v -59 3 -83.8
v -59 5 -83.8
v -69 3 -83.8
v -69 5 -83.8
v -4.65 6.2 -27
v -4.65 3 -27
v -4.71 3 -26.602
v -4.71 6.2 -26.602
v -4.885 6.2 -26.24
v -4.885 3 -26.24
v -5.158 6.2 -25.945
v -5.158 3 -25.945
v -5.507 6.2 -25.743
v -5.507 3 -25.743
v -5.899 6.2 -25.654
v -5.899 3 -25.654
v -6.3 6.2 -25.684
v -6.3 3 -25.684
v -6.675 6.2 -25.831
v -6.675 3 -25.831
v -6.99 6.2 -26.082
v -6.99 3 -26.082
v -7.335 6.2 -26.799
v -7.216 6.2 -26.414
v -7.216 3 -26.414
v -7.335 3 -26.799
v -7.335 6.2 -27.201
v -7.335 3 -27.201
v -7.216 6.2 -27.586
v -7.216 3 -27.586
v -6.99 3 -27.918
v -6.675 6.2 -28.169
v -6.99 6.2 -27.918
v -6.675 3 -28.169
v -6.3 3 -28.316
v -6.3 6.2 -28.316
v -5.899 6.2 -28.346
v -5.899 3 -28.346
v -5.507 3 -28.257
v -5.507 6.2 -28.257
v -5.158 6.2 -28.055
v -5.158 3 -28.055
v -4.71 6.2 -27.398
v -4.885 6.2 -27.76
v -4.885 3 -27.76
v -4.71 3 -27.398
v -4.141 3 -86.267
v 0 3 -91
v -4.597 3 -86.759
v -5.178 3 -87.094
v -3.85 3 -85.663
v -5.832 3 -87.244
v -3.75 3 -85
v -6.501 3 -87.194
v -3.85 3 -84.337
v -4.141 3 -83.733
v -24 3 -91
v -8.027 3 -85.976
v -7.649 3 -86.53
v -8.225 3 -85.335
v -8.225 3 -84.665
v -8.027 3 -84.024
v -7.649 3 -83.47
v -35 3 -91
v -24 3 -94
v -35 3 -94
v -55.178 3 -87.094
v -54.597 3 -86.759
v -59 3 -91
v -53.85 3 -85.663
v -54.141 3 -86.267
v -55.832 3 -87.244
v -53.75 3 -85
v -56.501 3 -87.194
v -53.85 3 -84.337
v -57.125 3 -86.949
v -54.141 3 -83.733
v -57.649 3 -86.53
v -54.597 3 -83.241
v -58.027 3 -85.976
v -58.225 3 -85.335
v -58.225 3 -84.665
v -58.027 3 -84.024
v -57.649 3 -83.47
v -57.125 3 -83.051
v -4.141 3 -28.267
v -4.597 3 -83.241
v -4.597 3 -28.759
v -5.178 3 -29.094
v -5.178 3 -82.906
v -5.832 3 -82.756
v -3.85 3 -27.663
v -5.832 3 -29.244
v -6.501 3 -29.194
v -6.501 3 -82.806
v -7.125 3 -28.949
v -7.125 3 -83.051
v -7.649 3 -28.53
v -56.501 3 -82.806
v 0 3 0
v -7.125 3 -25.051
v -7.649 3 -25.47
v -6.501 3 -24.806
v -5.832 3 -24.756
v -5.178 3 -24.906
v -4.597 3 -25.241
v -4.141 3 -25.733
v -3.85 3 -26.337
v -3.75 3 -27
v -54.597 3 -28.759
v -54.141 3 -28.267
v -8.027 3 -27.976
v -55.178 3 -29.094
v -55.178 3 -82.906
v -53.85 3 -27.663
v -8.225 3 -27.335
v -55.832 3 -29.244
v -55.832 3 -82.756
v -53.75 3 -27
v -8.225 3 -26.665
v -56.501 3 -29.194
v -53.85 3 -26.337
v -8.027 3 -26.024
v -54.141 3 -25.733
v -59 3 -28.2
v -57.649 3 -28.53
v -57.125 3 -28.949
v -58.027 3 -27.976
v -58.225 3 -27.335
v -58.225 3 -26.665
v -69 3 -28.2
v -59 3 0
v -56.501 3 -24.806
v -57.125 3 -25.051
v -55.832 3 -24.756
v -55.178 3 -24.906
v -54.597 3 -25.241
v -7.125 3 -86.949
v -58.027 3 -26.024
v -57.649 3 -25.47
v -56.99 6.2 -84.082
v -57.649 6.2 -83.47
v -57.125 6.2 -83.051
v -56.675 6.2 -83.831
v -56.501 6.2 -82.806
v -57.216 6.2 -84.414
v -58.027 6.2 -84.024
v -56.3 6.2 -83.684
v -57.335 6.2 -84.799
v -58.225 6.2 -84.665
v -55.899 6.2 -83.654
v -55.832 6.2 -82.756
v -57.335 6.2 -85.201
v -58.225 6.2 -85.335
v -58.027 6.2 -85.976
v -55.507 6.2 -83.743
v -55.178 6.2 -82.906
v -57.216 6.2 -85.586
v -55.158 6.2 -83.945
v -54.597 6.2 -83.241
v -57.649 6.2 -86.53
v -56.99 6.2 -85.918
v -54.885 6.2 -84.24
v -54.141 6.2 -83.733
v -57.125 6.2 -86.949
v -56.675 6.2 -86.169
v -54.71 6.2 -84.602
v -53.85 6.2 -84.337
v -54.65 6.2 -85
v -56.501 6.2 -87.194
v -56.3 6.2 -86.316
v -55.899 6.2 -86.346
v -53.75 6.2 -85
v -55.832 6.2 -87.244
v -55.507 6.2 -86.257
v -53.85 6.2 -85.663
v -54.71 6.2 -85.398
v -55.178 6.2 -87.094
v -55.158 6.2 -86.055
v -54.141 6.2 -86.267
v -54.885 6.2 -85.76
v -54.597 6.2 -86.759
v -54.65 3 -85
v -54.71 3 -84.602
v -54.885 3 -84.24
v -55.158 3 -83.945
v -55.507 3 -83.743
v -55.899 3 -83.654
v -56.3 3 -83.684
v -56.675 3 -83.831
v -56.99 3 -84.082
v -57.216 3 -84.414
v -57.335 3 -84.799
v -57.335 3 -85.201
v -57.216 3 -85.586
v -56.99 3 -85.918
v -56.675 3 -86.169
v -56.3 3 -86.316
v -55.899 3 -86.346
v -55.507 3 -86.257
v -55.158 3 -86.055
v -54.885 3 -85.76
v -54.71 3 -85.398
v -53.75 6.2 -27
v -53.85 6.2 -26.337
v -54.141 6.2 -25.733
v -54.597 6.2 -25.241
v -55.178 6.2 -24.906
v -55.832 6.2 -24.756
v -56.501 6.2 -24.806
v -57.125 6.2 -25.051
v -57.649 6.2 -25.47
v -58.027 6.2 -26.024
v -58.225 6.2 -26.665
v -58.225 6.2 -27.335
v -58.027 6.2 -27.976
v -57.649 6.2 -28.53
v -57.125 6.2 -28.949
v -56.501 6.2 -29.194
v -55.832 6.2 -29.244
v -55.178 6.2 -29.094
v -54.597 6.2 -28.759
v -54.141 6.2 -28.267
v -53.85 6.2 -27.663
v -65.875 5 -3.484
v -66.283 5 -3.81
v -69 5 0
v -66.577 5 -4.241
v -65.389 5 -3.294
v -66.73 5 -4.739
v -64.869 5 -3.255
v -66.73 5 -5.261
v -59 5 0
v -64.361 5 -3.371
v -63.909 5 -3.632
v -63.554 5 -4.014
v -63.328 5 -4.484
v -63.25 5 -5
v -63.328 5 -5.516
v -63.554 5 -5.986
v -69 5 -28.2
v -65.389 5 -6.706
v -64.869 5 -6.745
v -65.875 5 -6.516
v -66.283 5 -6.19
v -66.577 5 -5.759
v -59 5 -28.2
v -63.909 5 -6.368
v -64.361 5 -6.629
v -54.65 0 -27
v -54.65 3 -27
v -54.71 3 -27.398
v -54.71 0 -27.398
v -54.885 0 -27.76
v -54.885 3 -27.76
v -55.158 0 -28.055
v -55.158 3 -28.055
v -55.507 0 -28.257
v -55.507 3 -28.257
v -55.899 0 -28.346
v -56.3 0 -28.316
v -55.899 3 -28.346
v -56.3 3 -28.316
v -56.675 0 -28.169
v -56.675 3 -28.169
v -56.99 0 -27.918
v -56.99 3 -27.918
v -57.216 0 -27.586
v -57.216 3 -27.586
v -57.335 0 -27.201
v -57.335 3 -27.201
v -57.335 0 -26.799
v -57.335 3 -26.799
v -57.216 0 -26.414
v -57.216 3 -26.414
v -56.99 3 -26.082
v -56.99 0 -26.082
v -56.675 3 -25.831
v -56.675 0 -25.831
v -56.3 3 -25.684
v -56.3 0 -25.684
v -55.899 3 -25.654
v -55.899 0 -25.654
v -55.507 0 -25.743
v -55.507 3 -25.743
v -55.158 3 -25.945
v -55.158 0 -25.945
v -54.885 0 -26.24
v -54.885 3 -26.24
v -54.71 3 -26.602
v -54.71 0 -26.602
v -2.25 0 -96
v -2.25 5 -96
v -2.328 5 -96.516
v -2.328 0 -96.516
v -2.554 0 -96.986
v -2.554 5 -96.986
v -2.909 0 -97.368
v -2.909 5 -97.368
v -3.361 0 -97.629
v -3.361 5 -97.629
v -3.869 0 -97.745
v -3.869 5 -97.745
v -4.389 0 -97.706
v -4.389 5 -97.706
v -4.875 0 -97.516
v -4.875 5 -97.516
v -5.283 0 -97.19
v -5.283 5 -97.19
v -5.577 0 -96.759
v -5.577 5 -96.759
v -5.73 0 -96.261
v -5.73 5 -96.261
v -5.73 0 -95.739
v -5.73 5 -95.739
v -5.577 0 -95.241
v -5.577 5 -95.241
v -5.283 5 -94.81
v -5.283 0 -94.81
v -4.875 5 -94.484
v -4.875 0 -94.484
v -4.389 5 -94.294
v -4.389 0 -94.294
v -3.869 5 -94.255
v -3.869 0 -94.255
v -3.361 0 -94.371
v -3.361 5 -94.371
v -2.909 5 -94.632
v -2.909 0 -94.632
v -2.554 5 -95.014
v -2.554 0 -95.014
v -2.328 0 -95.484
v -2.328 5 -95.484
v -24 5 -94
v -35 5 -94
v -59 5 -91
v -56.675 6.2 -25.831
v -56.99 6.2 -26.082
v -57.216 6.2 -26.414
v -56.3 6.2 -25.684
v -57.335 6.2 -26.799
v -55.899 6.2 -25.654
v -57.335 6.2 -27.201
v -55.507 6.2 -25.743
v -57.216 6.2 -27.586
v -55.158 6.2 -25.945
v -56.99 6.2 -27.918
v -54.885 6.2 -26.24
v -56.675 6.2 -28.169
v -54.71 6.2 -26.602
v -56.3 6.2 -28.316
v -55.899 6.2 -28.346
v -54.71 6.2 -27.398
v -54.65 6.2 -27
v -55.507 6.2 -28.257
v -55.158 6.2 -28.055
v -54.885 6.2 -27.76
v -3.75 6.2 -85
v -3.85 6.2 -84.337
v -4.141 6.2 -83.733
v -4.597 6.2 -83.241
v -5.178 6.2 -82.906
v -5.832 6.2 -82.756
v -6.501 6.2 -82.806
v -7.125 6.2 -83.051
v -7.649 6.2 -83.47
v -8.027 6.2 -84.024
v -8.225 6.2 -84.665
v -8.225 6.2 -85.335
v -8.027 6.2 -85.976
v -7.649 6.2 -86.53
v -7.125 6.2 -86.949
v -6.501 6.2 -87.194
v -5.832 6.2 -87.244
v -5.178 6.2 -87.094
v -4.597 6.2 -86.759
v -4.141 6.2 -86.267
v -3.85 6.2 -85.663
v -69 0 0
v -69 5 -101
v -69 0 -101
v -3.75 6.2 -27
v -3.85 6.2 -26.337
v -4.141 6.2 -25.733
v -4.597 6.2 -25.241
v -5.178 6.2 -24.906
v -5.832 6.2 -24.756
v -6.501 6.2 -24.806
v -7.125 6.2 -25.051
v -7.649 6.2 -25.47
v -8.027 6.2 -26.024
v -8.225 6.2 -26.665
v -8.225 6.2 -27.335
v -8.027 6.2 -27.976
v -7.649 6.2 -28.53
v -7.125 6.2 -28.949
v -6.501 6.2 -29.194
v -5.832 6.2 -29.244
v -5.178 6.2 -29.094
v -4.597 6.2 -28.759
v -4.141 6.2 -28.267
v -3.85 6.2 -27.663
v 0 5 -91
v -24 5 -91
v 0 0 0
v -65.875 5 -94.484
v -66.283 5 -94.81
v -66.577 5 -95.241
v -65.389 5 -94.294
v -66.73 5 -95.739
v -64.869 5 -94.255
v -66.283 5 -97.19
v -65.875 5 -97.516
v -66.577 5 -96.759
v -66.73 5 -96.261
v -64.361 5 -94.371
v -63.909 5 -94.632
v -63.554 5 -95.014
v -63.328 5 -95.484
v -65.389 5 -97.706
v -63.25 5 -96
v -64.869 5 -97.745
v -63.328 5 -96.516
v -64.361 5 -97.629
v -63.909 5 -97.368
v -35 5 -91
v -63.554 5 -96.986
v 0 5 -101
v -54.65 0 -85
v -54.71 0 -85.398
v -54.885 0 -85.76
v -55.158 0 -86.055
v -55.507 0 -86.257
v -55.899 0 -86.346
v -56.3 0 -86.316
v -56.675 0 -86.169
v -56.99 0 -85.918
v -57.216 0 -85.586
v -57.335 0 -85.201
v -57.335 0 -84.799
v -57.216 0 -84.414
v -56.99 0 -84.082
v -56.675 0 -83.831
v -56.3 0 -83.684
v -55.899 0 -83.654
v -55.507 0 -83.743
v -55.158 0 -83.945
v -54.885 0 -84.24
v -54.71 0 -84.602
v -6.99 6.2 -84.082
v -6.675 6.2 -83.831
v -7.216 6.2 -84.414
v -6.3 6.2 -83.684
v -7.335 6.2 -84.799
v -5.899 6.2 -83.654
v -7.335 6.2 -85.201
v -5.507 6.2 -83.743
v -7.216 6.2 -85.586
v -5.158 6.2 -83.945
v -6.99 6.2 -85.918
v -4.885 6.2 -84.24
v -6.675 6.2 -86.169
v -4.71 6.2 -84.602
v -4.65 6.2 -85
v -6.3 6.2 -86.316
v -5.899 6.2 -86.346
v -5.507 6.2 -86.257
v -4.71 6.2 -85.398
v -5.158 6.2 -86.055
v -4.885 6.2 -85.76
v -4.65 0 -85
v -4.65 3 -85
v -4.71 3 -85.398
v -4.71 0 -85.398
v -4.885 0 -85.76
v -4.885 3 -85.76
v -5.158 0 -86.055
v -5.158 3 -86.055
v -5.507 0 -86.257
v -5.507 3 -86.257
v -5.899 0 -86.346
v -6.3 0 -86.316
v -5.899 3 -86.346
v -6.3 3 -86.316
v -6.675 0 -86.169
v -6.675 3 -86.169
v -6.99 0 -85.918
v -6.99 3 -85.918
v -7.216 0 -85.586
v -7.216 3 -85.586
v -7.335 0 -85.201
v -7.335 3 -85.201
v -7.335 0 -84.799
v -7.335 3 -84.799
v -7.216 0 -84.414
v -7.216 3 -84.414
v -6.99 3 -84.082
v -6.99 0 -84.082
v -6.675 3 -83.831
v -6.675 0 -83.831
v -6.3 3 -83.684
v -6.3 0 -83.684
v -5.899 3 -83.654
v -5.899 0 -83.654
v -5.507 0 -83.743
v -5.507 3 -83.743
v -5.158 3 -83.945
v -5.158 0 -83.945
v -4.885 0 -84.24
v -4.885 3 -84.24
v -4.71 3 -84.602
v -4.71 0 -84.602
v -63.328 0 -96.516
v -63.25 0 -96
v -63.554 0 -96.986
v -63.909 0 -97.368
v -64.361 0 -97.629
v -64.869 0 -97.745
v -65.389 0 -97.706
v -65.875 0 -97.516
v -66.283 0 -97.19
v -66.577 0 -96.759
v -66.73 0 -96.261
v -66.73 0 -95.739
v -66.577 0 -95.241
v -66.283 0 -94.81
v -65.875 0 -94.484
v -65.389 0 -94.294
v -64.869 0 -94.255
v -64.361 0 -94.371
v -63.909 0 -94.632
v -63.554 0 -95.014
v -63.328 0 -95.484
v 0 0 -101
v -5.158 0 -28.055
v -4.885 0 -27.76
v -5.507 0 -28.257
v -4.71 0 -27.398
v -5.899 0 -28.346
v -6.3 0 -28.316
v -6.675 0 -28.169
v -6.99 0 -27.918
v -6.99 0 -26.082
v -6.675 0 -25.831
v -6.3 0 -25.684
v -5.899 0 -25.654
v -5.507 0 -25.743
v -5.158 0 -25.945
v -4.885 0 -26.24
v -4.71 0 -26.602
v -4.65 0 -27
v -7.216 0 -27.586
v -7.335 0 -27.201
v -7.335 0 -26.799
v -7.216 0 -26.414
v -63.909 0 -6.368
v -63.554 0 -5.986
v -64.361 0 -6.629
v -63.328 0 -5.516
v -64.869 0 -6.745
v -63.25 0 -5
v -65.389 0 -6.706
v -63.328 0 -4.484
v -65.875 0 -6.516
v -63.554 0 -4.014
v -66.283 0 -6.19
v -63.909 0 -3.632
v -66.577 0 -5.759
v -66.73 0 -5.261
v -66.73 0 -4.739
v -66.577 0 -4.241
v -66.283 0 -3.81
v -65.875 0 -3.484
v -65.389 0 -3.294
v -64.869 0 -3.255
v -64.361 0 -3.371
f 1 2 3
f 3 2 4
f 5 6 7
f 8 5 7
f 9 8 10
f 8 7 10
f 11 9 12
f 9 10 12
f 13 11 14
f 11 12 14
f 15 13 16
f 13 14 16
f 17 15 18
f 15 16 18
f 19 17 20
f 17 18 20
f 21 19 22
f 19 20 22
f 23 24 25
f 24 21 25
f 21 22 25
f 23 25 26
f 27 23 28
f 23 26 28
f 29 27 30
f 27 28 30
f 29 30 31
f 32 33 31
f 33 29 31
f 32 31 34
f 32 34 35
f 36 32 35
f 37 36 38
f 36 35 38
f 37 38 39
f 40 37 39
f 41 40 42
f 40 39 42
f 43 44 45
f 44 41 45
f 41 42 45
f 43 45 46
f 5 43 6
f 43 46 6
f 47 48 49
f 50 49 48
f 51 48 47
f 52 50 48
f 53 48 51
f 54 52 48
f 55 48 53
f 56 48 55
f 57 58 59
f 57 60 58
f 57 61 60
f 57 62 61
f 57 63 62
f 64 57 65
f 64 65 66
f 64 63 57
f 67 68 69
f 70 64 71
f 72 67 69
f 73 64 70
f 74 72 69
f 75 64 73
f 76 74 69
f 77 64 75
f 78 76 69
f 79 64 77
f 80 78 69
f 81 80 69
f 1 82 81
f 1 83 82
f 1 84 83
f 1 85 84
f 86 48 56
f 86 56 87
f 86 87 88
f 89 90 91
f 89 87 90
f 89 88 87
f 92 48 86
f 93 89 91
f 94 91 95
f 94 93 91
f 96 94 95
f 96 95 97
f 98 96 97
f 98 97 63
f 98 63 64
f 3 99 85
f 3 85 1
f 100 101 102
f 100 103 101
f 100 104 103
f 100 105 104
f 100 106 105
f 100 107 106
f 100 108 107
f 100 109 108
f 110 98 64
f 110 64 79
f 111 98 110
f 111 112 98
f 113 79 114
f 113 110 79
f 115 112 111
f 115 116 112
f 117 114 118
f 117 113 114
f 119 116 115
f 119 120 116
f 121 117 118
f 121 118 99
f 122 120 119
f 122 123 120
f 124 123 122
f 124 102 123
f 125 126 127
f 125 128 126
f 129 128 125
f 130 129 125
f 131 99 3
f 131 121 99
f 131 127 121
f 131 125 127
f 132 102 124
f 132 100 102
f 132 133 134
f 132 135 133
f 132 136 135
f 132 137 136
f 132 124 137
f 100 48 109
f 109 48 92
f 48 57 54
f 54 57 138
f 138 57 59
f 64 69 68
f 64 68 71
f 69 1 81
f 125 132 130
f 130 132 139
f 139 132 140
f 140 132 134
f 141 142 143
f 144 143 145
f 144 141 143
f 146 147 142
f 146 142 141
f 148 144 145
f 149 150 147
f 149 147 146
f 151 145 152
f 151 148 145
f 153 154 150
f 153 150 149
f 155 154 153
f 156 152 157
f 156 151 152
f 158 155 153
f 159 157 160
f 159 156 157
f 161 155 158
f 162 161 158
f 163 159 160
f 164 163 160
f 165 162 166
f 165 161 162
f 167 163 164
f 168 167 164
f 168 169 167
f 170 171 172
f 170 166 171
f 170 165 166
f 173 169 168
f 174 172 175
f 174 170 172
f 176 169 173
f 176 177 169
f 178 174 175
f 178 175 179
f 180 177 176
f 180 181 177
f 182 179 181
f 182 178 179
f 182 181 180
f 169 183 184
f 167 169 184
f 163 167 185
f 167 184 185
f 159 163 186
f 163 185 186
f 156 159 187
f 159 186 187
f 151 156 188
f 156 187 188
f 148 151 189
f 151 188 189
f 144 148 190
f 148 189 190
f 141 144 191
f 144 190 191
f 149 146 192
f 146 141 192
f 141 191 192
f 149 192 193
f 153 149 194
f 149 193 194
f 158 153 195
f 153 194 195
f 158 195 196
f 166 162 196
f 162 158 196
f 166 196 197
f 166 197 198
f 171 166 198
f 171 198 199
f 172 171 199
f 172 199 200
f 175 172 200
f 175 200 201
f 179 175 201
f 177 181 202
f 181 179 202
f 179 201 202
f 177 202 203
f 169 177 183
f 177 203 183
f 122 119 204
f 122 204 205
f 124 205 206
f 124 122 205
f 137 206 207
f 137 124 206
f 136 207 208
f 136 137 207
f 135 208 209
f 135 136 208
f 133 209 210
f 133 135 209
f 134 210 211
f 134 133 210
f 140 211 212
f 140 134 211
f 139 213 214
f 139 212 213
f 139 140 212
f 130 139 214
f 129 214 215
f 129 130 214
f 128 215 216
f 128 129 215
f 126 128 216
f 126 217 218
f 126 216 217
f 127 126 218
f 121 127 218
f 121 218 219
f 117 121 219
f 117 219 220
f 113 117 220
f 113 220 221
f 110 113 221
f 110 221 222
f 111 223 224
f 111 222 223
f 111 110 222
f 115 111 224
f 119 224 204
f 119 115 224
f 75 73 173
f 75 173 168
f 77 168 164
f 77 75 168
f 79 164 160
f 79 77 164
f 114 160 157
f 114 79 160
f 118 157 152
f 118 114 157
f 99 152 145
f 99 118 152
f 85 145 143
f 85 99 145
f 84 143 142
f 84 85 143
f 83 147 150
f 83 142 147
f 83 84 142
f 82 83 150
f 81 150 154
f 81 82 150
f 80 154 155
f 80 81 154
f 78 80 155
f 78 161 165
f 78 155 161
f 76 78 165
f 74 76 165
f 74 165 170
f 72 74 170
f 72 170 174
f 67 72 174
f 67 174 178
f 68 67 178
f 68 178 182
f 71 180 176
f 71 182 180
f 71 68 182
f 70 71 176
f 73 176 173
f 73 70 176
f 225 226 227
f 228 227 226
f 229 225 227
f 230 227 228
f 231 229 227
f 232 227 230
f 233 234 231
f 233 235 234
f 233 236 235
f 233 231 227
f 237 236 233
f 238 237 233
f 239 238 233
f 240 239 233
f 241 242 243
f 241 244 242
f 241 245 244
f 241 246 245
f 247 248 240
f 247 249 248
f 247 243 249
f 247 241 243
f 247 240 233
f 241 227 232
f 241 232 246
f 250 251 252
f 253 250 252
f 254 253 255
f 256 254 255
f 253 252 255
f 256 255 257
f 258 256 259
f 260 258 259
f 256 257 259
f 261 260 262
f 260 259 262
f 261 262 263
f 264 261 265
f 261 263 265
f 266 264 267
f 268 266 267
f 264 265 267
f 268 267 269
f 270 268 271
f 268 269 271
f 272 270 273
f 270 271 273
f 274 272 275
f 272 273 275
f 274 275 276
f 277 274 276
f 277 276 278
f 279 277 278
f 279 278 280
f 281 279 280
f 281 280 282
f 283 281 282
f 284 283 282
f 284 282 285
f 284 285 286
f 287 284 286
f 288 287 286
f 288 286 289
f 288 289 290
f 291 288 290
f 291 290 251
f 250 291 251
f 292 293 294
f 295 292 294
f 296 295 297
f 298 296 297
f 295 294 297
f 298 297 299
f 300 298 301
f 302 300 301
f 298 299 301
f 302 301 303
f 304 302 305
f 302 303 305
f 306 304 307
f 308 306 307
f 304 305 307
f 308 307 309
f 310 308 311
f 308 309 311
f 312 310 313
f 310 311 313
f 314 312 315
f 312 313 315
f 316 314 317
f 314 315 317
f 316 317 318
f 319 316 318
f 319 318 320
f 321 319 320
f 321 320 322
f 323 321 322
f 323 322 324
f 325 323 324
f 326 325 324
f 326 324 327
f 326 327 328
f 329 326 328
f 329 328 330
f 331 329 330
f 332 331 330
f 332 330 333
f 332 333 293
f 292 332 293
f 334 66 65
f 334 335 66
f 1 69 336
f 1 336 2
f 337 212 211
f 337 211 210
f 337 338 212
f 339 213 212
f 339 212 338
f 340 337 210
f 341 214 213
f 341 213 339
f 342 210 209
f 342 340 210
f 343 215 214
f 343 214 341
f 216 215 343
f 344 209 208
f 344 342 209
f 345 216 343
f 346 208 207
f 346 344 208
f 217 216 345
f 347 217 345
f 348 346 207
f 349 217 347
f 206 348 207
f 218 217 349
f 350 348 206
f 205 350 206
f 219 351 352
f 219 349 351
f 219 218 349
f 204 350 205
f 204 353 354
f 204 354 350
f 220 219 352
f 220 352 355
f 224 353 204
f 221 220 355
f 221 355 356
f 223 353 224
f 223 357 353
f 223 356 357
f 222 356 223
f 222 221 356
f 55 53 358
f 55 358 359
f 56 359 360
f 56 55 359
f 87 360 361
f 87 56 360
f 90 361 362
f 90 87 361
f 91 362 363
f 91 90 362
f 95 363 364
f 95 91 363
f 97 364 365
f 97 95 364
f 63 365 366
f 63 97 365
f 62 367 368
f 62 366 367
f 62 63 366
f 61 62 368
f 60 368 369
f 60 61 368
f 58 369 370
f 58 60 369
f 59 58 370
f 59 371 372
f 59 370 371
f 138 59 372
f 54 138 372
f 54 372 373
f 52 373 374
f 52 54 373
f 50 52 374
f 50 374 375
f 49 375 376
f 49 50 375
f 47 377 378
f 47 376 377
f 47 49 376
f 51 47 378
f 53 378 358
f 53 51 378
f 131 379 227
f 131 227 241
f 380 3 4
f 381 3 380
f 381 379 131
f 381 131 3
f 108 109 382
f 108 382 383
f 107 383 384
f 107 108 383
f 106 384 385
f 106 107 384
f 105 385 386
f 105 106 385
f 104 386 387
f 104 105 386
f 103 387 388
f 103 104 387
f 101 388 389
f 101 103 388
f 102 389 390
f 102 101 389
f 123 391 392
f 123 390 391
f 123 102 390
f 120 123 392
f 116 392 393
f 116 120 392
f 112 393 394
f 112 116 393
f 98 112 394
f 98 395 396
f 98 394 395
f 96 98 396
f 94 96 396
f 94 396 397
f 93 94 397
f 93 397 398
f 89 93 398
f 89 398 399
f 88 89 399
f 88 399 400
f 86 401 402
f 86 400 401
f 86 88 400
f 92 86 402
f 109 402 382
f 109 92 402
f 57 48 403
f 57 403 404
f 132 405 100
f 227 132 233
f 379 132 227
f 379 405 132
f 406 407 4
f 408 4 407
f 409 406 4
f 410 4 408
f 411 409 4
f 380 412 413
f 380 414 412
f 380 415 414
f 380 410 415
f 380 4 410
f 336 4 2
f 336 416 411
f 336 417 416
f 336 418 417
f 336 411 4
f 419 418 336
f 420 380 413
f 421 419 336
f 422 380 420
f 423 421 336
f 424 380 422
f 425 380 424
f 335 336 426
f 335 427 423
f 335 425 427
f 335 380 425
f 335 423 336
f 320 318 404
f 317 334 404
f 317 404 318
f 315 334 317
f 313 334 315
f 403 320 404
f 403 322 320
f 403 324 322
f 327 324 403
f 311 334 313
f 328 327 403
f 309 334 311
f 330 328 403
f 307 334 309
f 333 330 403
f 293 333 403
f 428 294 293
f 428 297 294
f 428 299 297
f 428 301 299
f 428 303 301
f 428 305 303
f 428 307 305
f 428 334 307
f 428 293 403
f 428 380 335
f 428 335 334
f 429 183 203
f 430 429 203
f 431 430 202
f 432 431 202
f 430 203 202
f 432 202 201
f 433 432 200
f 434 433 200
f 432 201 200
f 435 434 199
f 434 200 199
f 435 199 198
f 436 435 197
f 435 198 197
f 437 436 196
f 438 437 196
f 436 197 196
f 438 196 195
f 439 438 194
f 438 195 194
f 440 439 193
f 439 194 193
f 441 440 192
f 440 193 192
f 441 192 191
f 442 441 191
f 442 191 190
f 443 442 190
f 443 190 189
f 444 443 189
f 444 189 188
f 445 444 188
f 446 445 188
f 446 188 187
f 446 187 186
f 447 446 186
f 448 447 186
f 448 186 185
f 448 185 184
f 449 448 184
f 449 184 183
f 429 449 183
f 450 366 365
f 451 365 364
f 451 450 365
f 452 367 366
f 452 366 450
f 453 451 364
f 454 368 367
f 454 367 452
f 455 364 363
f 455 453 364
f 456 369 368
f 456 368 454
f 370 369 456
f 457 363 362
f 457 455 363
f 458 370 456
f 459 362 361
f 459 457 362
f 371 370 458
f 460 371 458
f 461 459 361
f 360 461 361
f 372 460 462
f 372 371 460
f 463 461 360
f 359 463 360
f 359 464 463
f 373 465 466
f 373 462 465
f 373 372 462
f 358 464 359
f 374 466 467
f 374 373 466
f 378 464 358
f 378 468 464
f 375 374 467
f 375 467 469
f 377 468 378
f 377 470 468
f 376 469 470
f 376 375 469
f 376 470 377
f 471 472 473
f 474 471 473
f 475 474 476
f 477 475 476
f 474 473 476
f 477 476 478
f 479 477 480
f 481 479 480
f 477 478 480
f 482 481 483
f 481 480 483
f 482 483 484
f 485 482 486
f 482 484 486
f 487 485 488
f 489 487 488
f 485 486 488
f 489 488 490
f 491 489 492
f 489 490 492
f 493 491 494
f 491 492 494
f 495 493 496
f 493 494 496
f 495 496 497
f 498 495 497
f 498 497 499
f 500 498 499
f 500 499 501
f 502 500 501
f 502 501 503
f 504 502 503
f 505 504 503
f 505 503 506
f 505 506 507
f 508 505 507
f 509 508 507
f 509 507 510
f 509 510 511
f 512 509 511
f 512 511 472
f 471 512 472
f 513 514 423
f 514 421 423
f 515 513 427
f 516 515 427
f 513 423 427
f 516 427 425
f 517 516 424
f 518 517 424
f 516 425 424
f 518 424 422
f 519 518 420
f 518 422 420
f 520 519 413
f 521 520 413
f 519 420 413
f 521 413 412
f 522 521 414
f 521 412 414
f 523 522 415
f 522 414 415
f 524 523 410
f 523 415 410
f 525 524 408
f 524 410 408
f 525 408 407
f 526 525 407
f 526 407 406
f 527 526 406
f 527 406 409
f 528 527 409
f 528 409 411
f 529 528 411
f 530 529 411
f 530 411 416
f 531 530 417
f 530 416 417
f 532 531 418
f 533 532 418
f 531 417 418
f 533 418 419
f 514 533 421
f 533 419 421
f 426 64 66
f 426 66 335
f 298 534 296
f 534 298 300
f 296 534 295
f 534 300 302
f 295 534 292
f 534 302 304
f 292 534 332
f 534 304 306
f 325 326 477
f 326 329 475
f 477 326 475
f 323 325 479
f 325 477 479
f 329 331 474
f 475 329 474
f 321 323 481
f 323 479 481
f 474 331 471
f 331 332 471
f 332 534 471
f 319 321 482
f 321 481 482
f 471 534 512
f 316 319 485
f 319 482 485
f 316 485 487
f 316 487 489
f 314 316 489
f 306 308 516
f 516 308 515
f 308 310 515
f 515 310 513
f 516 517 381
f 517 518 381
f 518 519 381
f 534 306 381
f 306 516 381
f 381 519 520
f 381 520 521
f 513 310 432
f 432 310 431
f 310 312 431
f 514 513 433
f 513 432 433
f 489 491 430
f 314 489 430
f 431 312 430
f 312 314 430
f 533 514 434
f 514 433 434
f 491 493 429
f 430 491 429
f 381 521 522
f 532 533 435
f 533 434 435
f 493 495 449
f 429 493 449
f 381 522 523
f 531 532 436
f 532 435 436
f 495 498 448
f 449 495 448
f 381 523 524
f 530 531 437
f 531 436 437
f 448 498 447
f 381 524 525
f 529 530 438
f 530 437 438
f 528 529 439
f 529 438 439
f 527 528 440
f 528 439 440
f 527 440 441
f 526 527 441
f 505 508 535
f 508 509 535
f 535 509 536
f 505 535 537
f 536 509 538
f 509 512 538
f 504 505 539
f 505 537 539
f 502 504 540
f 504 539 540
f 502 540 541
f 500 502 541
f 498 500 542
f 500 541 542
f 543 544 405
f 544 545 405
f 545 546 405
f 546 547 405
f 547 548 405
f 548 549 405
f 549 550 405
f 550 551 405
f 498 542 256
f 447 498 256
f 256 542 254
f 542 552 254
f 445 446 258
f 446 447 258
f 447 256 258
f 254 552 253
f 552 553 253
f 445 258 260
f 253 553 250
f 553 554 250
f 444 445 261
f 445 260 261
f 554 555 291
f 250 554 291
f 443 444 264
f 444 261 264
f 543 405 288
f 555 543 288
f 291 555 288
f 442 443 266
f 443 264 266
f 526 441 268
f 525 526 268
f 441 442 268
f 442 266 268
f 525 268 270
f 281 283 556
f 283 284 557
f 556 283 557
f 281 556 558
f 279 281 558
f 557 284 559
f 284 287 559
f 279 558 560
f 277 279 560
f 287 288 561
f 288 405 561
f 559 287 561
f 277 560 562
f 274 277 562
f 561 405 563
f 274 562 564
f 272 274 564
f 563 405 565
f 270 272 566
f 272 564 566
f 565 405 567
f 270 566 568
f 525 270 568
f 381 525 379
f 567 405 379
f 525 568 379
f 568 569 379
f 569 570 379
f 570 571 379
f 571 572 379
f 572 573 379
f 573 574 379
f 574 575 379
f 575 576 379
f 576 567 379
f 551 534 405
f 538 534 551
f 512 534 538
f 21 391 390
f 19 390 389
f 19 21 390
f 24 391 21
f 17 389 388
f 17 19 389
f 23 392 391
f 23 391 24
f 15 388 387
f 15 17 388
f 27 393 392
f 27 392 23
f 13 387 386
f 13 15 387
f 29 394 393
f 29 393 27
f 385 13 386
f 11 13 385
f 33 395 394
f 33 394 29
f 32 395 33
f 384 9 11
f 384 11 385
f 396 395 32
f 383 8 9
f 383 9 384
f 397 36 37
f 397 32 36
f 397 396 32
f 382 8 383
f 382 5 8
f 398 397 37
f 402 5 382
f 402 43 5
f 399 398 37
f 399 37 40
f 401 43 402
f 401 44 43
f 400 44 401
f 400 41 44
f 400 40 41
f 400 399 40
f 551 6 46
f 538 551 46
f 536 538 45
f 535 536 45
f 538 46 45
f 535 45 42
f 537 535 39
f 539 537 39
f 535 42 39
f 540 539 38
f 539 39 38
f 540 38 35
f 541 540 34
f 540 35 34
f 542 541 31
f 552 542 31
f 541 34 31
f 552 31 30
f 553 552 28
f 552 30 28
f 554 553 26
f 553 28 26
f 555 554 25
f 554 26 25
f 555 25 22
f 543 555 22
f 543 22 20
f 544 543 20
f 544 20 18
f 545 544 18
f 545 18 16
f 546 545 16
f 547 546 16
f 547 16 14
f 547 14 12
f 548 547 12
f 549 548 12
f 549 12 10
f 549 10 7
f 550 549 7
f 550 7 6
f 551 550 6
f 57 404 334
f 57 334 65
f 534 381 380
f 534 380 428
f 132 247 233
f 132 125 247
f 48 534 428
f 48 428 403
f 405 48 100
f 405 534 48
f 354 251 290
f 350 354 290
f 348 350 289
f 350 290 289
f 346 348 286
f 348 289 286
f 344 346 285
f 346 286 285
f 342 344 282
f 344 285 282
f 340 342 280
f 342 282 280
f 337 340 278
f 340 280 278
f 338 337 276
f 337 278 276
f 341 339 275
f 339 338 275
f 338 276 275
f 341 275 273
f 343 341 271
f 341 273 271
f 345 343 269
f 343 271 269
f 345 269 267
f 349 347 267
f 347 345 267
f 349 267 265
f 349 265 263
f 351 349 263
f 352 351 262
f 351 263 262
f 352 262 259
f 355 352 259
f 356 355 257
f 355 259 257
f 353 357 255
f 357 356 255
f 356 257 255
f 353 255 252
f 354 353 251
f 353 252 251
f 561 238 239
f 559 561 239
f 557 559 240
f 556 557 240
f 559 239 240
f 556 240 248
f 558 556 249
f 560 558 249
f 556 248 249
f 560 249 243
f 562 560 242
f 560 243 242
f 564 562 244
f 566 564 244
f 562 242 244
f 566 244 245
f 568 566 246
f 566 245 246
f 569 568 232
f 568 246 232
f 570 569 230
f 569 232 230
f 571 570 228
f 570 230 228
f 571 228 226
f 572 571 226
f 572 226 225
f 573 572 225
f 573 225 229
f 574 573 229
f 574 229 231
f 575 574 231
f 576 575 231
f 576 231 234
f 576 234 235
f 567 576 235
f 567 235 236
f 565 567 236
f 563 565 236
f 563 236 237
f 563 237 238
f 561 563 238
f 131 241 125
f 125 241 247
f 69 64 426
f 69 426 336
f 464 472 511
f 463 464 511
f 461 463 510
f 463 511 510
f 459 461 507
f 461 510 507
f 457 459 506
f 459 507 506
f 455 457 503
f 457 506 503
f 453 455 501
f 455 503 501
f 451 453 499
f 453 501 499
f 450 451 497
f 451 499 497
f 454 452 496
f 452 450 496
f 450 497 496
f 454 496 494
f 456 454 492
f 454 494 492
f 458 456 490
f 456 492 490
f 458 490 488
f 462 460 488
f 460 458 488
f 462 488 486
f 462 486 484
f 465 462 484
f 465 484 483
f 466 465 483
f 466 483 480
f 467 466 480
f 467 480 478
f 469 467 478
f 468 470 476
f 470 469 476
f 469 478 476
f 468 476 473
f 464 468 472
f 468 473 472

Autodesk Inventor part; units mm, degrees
ref_plane "YZ Plane" through (0, 0, 0) normal (1, 0, 0) x (0, 1, 0)
ref_plane "XZ Plane" through (0, 0, 0) normal (0, 1, 0) x (-1, 0, 0)
ref_plane "XY Plane" through (0, 0, 0) normal (0, 0, 1) x (1, 0, 0)
sketch "Sketch1" plane through (0, 0, 0) normal (0, 1, 0) x (-1, 0, 0)
  line L0 (0, 0) -> (59, 0)
  line L1 (59, 0) -> (59, -91)
  line L2 (59, -91) -> (0, -91)
  line L3 (0, -91) -> (0, 0)
  dimension "d0" = 59
  dimension "d1" = 91
extrude "Extrusion1" add sketch "Sketch1" along normal blind 3
sketch "Sketch2" plane through (0, 3, 0) normal (0, 1, 0) x (1, 0, 0)
  line L0 (0, 0) -> (-69, 0)
  line L1 (-69, 0) -> (-69, 101)
  line L2 (-69, 101) -> (0, 101)
  line L3 (0, 101) -> (0, 0)
  line L4 (-59, 91) -> (-59, 0) projected
  line L5 (0, 91) -> (-59, 91) projected
  dimension "d4" = 10
  dimension "d5" = 10
extrude "Extrusion2" add sketch "Sketch2" along normal blind 2 and the other way blind 3 contours L0 L1 L2 L3 L5 L4
sketch "Sketch3" plane through (0, 3, 0) normal (0, 1, 0) x (1, 0, 0)
  circle A0 centre (-56, 27) radius 1.35
  line L0 (-59, 0) -> (-59, 91) projected
  line L1 (-59, 0) -> (0, 0) projected
  circle A1 centre (-6, 27) radius 1.35
  line L2 (0, 0) -> (0, 91) projected
  circle A2 centre (-56, 85) radius 1.35
  line L3 (-59, 91) -> (0, 91) projected
  circle A3 centre (-6, 85) radius 1.35
  dimension "d10" = 2.7
  dimension "d11" = 3
  dimension "d12" = 27
  dimension "d13" = 2.7
  dimension "d14" = 6
  dimension "d15" = 27
  dimension "d16" = 2.7
  dimension "d17" = 3
  dimension "d18" = 6
  dimension "d19" = 2.7
  dimension "d20" = 6
  dimension "d21" = 6
extrude "Extrusion3" cut sketch "Sketch3" against normal blind 3 contours A0 | A1 | A2 | A3
sketch "Sketch4" plane through (0, 3, 0) normal (0, 1, 0) x (1, 0, 0)
  point P0 (0, 0)
sketch "Sketch5" plane through (0, 3, 0) normal (0, 1, 0) x (1, 0, 0)
  circle A0 centre (-56, 27) radius 2.25
  circle A1 centre (-56, 27) radius 1.35 projected
  circle A2 centre (-56, 85) radius 2.25
  circle A3 centre (-6, 85) radius 2.25
  circle A4 centre (-6, 85) radius 1.35 projected
  circle A5 centre (-56, 85) radius 1.35 projected
  circle A6 centre (-6, 27) radius 2.25
  circle A7 centre (-6, 27) radius 1.35 projected
  point P0 (0, 0)
  dimension "d24" = 0
  dimension "d25" = 0
  dimension "d26" = 4.5
  dimension "d27" = 4.5
  dimension "d28" = 4.5
  dimension "d29" = 0
  dimension "d30" = 0
  dimension "d31" = 0
  dimension "d32" = 4.5
  dimension "d33" = 0.9
  dimension "d34" = 0.9
  dimension "d35" = 0.9
  dimension "d36" = 0.9
extrude "Extrusion4" add sketch "Sketch5" along normal blind 3.2
sketch "Sketch6" plane through (-59, 3, -91) normal (0, 0, 1) x (1, 0, 0)
  line L0 (0, 2) -> (59, 2) projected
  line L1 (0, 0) -> (59, 0) projected
  line L2 (24, 2) -> (35, 2)
  line L3 (35, 2) -> (35, 0)
  line L4 (35, 0) -> (24, 0)
  line L5 (24, 0) -> (24, 2)
  line L6 (59, 0) -> (59, 2) projected
  line L7 (0, 0) -> (0, 2) projected
  point P0 (59, -3)
  point P1 (24, 0)
  dimension "d39" = 11
  dimension "d40" = 24
  dimension "d41" = 24
extrude "Extrusion5" cut sketch "Sketch6" against normal blind 3 contours L0 L3 L1 L5
sketch "Sketch7" plane through (0, 5, 0) normal (0, 1, 0) x (1, 0, 0)
  circle A0 centre (-65, 5) radius 1.75
  line L0 (-69, 101) -> (-69, 0) projected
  line L1 (-69, 0) -> (-59, 0) projected
  circle A1 centre (-65, 96) radius 1.75
  line L2 (0, 101) -> (-69, 101) projected
  circle A2 centre (-4, 96) radius 1.75
  line L3 (0, 91) -> (0, 101) projected
  point P0 (0, 0)
  dimension "d44" = 3.5
  dimension "d45" = 4
  dimension "d46" = 5
  dimension "d47" = 3.5
  dimension "d48" = 4
  dimension "d49" = 5
  dimension "d50" = 3.5
  dimension "d51" = 5
  dimension "d52" = 4
extrude "Extrusion6" cut sketch "Sketch7" against normal blind 19
sketch "Sketch8" plane through (0, 5, 0) normal (0, 1, 0) x (1, 0, 0)
  line L0 (-69, 101) -> (-69, 0) projected
  line L1 (-59, 83.8) -> (-69, 83.8)
  line L2 (-69, 83.8) -> (-69, 28.2)
  line L3 (-69, 28.2) -> (-59, 28.2)
  line L4 (-59, 28.2) -> (-59, 83.8)
  line L5 (-59, 0) -> (-59, 91) projected
  circle A0 centre (-56, 27) radius 2.25 projected
  circle A1 centre (-56, 85) radius 1.35 projected
  point P0 (0, 0)
  dimension "d55" = 0
  dimension "d56" = 1.2
  dimension "d57" = 1.2
extrude "Extrusion7" cut sketch "Sketch8" against normal blind 2 contours L1 L4 L3 L0
properties part number "ThridPrototypeRaspPiBed"
